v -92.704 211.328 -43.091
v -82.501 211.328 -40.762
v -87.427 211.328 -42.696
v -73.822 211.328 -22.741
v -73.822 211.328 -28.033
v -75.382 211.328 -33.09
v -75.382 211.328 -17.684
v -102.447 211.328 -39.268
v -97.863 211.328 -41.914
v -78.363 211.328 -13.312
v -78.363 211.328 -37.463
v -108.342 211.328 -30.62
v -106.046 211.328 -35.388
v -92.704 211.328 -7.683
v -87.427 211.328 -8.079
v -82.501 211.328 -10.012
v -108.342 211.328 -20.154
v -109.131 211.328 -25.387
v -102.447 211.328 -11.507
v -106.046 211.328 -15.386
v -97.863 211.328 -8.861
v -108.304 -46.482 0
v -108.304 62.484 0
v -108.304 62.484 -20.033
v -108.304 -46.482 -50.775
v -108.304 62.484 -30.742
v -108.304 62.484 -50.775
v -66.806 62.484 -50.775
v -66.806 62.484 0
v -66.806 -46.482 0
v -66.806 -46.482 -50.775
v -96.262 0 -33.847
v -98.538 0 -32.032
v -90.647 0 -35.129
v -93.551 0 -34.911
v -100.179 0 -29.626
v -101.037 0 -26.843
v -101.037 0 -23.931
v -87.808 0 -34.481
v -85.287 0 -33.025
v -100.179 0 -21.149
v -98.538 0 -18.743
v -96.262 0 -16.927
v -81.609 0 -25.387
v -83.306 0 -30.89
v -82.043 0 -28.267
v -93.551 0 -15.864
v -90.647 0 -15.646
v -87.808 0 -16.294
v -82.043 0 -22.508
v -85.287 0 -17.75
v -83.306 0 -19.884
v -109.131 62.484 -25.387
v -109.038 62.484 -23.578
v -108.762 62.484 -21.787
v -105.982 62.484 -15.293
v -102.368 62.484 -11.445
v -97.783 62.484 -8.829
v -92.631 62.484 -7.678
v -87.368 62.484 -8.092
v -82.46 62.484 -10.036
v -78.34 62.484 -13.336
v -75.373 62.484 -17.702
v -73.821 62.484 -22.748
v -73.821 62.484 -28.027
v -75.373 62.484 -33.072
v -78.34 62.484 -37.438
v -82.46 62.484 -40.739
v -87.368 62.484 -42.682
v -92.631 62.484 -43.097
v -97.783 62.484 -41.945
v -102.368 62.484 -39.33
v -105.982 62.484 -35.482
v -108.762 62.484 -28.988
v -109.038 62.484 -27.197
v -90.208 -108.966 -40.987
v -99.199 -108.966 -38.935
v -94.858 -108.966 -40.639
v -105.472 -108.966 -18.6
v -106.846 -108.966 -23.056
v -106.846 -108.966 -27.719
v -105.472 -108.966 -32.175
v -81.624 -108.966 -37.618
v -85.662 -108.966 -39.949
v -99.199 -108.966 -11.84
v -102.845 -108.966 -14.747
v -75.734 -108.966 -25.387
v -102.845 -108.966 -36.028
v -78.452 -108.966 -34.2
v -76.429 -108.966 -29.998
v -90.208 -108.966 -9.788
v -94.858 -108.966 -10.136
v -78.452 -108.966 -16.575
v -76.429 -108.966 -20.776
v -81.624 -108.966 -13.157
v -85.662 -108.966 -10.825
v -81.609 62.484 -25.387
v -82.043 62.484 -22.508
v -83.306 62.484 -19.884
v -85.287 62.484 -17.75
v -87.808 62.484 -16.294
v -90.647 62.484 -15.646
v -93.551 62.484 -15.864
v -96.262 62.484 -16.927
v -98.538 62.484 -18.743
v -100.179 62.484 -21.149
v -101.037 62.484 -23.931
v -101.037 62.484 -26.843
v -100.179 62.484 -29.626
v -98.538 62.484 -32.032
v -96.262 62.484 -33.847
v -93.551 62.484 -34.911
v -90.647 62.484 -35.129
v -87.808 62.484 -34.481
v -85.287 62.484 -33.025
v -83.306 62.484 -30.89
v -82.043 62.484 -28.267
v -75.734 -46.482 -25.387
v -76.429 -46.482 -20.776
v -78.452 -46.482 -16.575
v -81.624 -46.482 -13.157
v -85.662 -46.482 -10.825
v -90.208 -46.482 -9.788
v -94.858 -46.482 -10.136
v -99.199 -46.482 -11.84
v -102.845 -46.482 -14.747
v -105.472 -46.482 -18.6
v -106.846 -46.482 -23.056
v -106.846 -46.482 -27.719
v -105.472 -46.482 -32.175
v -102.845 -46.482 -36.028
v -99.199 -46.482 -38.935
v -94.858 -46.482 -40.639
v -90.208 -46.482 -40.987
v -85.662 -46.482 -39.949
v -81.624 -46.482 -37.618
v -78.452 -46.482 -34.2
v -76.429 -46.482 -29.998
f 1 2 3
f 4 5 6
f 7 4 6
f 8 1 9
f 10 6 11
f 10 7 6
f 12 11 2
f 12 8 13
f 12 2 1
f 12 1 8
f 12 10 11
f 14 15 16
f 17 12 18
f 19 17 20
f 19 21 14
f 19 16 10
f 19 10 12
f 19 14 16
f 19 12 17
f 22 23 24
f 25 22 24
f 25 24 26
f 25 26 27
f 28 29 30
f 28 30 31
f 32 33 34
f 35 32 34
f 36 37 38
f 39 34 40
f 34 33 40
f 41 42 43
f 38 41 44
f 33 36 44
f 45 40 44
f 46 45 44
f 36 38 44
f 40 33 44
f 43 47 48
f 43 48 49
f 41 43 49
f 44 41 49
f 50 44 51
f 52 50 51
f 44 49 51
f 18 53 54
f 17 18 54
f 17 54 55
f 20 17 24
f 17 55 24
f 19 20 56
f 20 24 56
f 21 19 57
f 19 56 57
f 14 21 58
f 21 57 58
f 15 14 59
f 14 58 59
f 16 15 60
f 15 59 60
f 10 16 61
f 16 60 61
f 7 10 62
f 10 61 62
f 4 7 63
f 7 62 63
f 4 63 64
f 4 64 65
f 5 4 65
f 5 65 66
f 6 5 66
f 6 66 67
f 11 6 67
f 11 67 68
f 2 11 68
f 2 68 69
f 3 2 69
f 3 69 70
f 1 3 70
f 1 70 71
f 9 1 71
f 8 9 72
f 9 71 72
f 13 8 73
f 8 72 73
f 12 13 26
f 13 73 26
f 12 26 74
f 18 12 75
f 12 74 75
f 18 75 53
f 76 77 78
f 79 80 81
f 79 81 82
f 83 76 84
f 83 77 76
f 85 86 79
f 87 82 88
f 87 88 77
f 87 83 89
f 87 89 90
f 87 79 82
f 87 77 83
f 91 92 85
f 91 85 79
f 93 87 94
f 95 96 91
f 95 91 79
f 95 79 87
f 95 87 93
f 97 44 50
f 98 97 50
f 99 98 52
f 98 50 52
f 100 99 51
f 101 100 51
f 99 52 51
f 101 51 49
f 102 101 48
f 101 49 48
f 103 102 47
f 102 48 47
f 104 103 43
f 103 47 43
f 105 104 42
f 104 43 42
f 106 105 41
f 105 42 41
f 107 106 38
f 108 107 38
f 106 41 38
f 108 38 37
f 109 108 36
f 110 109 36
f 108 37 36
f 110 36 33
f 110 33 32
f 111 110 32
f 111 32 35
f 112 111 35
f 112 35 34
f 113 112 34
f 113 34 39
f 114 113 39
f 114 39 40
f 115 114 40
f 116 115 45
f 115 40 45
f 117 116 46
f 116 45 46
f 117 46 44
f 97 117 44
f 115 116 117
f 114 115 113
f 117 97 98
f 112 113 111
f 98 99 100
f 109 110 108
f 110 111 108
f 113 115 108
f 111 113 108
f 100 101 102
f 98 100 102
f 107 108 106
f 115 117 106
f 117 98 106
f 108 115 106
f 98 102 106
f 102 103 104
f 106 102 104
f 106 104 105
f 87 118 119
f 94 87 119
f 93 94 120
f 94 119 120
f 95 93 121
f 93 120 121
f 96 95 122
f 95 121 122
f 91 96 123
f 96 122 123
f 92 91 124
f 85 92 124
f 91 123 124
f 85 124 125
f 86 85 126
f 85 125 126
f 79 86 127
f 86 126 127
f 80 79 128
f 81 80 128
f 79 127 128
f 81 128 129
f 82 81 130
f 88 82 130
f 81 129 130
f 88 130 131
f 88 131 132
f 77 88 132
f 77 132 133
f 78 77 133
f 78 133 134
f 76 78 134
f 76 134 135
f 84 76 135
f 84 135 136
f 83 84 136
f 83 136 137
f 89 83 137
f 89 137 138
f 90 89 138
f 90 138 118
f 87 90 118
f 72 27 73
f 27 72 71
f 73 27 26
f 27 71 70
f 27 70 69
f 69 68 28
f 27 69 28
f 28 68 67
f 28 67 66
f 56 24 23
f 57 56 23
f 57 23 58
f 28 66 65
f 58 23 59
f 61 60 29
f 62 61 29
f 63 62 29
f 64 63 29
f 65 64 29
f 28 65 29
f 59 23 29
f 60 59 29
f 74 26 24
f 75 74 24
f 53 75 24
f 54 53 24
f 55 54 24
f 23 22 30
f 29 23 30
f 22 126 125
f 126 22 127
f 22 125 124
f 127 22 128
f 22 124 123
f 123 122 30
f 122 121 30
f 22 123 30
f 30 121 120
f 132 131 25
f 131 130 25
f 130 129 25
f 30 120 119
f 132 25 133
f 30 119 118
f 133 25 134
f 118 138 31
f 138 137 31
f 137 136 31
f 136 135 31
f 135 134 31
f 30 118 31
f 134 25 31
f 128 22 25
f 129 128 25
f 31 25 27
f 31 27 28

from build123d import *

# Parameters (mm, degrees)
F0_W       = 41.4983332157
F0_H       = 50.7746972144
F0_R       = 9.7686704189
F1_DEPTH   = 62.484
F2_R       = 15.6433873562
F1_FACE1_W = 41.4983332157
F1_FACE1_H = 50.7746972144
F1_FACE1_R = 9.7686704189
F3_DEPTH   = 108.966
F4_R       = 17.7535536274
F5_DEPTH   = 148.844


with BuildPart() as f1:
    # F0 (on Front) → F1 (new body)
    with BuildSketch(Plane.XZ):
        with Locations((-87.555155158, -25.3873486072)):
            Rectangle(F0_W, F0_H)
        with Locations((-91.3773775101, -25.3873486072)):
            Circle(F0_R, mode=Mode.SUBTRACT)
    extrude(amount=-F1_DEPTH)

    # F2 (on face) + F1_face1 (on face) → F3 (join)
    with BuildSketch(Plane.XZ):
        with Locations((-91.3773775101, -25.3873486072)):
            Circle(F2_R)
    with BuildSketch(Plane(origin=(-86.9211204596, 62.484, -25.3873486072), x_dir=(1, 0, 0), z_dir=(0, 1, 0))):
        with Locations((-0.6340346985, 0)):
            Rectangle(F1_FACE1_W, F1_FACE1_H)
        with Locations((-4.4562570505, 0)):
            Circle(F1_FACE1_R, mode=Mode.SUBTRACT)
    extrude(amount=F3_DEPTH, dir=(0, -1, 0))

    # F4 (on face) → F5 (join)
    with BuildSketch(Plane(origin=(0, 62.484, 0), x_dir=(-1, 0, 0), z_dir=(0, 1, 0))):
        with Locations((91.3773775101, -25.3873486072)):
            Circle(F4_R)
    extrude(amount=F5_DEPTH)


solid = f1.part
